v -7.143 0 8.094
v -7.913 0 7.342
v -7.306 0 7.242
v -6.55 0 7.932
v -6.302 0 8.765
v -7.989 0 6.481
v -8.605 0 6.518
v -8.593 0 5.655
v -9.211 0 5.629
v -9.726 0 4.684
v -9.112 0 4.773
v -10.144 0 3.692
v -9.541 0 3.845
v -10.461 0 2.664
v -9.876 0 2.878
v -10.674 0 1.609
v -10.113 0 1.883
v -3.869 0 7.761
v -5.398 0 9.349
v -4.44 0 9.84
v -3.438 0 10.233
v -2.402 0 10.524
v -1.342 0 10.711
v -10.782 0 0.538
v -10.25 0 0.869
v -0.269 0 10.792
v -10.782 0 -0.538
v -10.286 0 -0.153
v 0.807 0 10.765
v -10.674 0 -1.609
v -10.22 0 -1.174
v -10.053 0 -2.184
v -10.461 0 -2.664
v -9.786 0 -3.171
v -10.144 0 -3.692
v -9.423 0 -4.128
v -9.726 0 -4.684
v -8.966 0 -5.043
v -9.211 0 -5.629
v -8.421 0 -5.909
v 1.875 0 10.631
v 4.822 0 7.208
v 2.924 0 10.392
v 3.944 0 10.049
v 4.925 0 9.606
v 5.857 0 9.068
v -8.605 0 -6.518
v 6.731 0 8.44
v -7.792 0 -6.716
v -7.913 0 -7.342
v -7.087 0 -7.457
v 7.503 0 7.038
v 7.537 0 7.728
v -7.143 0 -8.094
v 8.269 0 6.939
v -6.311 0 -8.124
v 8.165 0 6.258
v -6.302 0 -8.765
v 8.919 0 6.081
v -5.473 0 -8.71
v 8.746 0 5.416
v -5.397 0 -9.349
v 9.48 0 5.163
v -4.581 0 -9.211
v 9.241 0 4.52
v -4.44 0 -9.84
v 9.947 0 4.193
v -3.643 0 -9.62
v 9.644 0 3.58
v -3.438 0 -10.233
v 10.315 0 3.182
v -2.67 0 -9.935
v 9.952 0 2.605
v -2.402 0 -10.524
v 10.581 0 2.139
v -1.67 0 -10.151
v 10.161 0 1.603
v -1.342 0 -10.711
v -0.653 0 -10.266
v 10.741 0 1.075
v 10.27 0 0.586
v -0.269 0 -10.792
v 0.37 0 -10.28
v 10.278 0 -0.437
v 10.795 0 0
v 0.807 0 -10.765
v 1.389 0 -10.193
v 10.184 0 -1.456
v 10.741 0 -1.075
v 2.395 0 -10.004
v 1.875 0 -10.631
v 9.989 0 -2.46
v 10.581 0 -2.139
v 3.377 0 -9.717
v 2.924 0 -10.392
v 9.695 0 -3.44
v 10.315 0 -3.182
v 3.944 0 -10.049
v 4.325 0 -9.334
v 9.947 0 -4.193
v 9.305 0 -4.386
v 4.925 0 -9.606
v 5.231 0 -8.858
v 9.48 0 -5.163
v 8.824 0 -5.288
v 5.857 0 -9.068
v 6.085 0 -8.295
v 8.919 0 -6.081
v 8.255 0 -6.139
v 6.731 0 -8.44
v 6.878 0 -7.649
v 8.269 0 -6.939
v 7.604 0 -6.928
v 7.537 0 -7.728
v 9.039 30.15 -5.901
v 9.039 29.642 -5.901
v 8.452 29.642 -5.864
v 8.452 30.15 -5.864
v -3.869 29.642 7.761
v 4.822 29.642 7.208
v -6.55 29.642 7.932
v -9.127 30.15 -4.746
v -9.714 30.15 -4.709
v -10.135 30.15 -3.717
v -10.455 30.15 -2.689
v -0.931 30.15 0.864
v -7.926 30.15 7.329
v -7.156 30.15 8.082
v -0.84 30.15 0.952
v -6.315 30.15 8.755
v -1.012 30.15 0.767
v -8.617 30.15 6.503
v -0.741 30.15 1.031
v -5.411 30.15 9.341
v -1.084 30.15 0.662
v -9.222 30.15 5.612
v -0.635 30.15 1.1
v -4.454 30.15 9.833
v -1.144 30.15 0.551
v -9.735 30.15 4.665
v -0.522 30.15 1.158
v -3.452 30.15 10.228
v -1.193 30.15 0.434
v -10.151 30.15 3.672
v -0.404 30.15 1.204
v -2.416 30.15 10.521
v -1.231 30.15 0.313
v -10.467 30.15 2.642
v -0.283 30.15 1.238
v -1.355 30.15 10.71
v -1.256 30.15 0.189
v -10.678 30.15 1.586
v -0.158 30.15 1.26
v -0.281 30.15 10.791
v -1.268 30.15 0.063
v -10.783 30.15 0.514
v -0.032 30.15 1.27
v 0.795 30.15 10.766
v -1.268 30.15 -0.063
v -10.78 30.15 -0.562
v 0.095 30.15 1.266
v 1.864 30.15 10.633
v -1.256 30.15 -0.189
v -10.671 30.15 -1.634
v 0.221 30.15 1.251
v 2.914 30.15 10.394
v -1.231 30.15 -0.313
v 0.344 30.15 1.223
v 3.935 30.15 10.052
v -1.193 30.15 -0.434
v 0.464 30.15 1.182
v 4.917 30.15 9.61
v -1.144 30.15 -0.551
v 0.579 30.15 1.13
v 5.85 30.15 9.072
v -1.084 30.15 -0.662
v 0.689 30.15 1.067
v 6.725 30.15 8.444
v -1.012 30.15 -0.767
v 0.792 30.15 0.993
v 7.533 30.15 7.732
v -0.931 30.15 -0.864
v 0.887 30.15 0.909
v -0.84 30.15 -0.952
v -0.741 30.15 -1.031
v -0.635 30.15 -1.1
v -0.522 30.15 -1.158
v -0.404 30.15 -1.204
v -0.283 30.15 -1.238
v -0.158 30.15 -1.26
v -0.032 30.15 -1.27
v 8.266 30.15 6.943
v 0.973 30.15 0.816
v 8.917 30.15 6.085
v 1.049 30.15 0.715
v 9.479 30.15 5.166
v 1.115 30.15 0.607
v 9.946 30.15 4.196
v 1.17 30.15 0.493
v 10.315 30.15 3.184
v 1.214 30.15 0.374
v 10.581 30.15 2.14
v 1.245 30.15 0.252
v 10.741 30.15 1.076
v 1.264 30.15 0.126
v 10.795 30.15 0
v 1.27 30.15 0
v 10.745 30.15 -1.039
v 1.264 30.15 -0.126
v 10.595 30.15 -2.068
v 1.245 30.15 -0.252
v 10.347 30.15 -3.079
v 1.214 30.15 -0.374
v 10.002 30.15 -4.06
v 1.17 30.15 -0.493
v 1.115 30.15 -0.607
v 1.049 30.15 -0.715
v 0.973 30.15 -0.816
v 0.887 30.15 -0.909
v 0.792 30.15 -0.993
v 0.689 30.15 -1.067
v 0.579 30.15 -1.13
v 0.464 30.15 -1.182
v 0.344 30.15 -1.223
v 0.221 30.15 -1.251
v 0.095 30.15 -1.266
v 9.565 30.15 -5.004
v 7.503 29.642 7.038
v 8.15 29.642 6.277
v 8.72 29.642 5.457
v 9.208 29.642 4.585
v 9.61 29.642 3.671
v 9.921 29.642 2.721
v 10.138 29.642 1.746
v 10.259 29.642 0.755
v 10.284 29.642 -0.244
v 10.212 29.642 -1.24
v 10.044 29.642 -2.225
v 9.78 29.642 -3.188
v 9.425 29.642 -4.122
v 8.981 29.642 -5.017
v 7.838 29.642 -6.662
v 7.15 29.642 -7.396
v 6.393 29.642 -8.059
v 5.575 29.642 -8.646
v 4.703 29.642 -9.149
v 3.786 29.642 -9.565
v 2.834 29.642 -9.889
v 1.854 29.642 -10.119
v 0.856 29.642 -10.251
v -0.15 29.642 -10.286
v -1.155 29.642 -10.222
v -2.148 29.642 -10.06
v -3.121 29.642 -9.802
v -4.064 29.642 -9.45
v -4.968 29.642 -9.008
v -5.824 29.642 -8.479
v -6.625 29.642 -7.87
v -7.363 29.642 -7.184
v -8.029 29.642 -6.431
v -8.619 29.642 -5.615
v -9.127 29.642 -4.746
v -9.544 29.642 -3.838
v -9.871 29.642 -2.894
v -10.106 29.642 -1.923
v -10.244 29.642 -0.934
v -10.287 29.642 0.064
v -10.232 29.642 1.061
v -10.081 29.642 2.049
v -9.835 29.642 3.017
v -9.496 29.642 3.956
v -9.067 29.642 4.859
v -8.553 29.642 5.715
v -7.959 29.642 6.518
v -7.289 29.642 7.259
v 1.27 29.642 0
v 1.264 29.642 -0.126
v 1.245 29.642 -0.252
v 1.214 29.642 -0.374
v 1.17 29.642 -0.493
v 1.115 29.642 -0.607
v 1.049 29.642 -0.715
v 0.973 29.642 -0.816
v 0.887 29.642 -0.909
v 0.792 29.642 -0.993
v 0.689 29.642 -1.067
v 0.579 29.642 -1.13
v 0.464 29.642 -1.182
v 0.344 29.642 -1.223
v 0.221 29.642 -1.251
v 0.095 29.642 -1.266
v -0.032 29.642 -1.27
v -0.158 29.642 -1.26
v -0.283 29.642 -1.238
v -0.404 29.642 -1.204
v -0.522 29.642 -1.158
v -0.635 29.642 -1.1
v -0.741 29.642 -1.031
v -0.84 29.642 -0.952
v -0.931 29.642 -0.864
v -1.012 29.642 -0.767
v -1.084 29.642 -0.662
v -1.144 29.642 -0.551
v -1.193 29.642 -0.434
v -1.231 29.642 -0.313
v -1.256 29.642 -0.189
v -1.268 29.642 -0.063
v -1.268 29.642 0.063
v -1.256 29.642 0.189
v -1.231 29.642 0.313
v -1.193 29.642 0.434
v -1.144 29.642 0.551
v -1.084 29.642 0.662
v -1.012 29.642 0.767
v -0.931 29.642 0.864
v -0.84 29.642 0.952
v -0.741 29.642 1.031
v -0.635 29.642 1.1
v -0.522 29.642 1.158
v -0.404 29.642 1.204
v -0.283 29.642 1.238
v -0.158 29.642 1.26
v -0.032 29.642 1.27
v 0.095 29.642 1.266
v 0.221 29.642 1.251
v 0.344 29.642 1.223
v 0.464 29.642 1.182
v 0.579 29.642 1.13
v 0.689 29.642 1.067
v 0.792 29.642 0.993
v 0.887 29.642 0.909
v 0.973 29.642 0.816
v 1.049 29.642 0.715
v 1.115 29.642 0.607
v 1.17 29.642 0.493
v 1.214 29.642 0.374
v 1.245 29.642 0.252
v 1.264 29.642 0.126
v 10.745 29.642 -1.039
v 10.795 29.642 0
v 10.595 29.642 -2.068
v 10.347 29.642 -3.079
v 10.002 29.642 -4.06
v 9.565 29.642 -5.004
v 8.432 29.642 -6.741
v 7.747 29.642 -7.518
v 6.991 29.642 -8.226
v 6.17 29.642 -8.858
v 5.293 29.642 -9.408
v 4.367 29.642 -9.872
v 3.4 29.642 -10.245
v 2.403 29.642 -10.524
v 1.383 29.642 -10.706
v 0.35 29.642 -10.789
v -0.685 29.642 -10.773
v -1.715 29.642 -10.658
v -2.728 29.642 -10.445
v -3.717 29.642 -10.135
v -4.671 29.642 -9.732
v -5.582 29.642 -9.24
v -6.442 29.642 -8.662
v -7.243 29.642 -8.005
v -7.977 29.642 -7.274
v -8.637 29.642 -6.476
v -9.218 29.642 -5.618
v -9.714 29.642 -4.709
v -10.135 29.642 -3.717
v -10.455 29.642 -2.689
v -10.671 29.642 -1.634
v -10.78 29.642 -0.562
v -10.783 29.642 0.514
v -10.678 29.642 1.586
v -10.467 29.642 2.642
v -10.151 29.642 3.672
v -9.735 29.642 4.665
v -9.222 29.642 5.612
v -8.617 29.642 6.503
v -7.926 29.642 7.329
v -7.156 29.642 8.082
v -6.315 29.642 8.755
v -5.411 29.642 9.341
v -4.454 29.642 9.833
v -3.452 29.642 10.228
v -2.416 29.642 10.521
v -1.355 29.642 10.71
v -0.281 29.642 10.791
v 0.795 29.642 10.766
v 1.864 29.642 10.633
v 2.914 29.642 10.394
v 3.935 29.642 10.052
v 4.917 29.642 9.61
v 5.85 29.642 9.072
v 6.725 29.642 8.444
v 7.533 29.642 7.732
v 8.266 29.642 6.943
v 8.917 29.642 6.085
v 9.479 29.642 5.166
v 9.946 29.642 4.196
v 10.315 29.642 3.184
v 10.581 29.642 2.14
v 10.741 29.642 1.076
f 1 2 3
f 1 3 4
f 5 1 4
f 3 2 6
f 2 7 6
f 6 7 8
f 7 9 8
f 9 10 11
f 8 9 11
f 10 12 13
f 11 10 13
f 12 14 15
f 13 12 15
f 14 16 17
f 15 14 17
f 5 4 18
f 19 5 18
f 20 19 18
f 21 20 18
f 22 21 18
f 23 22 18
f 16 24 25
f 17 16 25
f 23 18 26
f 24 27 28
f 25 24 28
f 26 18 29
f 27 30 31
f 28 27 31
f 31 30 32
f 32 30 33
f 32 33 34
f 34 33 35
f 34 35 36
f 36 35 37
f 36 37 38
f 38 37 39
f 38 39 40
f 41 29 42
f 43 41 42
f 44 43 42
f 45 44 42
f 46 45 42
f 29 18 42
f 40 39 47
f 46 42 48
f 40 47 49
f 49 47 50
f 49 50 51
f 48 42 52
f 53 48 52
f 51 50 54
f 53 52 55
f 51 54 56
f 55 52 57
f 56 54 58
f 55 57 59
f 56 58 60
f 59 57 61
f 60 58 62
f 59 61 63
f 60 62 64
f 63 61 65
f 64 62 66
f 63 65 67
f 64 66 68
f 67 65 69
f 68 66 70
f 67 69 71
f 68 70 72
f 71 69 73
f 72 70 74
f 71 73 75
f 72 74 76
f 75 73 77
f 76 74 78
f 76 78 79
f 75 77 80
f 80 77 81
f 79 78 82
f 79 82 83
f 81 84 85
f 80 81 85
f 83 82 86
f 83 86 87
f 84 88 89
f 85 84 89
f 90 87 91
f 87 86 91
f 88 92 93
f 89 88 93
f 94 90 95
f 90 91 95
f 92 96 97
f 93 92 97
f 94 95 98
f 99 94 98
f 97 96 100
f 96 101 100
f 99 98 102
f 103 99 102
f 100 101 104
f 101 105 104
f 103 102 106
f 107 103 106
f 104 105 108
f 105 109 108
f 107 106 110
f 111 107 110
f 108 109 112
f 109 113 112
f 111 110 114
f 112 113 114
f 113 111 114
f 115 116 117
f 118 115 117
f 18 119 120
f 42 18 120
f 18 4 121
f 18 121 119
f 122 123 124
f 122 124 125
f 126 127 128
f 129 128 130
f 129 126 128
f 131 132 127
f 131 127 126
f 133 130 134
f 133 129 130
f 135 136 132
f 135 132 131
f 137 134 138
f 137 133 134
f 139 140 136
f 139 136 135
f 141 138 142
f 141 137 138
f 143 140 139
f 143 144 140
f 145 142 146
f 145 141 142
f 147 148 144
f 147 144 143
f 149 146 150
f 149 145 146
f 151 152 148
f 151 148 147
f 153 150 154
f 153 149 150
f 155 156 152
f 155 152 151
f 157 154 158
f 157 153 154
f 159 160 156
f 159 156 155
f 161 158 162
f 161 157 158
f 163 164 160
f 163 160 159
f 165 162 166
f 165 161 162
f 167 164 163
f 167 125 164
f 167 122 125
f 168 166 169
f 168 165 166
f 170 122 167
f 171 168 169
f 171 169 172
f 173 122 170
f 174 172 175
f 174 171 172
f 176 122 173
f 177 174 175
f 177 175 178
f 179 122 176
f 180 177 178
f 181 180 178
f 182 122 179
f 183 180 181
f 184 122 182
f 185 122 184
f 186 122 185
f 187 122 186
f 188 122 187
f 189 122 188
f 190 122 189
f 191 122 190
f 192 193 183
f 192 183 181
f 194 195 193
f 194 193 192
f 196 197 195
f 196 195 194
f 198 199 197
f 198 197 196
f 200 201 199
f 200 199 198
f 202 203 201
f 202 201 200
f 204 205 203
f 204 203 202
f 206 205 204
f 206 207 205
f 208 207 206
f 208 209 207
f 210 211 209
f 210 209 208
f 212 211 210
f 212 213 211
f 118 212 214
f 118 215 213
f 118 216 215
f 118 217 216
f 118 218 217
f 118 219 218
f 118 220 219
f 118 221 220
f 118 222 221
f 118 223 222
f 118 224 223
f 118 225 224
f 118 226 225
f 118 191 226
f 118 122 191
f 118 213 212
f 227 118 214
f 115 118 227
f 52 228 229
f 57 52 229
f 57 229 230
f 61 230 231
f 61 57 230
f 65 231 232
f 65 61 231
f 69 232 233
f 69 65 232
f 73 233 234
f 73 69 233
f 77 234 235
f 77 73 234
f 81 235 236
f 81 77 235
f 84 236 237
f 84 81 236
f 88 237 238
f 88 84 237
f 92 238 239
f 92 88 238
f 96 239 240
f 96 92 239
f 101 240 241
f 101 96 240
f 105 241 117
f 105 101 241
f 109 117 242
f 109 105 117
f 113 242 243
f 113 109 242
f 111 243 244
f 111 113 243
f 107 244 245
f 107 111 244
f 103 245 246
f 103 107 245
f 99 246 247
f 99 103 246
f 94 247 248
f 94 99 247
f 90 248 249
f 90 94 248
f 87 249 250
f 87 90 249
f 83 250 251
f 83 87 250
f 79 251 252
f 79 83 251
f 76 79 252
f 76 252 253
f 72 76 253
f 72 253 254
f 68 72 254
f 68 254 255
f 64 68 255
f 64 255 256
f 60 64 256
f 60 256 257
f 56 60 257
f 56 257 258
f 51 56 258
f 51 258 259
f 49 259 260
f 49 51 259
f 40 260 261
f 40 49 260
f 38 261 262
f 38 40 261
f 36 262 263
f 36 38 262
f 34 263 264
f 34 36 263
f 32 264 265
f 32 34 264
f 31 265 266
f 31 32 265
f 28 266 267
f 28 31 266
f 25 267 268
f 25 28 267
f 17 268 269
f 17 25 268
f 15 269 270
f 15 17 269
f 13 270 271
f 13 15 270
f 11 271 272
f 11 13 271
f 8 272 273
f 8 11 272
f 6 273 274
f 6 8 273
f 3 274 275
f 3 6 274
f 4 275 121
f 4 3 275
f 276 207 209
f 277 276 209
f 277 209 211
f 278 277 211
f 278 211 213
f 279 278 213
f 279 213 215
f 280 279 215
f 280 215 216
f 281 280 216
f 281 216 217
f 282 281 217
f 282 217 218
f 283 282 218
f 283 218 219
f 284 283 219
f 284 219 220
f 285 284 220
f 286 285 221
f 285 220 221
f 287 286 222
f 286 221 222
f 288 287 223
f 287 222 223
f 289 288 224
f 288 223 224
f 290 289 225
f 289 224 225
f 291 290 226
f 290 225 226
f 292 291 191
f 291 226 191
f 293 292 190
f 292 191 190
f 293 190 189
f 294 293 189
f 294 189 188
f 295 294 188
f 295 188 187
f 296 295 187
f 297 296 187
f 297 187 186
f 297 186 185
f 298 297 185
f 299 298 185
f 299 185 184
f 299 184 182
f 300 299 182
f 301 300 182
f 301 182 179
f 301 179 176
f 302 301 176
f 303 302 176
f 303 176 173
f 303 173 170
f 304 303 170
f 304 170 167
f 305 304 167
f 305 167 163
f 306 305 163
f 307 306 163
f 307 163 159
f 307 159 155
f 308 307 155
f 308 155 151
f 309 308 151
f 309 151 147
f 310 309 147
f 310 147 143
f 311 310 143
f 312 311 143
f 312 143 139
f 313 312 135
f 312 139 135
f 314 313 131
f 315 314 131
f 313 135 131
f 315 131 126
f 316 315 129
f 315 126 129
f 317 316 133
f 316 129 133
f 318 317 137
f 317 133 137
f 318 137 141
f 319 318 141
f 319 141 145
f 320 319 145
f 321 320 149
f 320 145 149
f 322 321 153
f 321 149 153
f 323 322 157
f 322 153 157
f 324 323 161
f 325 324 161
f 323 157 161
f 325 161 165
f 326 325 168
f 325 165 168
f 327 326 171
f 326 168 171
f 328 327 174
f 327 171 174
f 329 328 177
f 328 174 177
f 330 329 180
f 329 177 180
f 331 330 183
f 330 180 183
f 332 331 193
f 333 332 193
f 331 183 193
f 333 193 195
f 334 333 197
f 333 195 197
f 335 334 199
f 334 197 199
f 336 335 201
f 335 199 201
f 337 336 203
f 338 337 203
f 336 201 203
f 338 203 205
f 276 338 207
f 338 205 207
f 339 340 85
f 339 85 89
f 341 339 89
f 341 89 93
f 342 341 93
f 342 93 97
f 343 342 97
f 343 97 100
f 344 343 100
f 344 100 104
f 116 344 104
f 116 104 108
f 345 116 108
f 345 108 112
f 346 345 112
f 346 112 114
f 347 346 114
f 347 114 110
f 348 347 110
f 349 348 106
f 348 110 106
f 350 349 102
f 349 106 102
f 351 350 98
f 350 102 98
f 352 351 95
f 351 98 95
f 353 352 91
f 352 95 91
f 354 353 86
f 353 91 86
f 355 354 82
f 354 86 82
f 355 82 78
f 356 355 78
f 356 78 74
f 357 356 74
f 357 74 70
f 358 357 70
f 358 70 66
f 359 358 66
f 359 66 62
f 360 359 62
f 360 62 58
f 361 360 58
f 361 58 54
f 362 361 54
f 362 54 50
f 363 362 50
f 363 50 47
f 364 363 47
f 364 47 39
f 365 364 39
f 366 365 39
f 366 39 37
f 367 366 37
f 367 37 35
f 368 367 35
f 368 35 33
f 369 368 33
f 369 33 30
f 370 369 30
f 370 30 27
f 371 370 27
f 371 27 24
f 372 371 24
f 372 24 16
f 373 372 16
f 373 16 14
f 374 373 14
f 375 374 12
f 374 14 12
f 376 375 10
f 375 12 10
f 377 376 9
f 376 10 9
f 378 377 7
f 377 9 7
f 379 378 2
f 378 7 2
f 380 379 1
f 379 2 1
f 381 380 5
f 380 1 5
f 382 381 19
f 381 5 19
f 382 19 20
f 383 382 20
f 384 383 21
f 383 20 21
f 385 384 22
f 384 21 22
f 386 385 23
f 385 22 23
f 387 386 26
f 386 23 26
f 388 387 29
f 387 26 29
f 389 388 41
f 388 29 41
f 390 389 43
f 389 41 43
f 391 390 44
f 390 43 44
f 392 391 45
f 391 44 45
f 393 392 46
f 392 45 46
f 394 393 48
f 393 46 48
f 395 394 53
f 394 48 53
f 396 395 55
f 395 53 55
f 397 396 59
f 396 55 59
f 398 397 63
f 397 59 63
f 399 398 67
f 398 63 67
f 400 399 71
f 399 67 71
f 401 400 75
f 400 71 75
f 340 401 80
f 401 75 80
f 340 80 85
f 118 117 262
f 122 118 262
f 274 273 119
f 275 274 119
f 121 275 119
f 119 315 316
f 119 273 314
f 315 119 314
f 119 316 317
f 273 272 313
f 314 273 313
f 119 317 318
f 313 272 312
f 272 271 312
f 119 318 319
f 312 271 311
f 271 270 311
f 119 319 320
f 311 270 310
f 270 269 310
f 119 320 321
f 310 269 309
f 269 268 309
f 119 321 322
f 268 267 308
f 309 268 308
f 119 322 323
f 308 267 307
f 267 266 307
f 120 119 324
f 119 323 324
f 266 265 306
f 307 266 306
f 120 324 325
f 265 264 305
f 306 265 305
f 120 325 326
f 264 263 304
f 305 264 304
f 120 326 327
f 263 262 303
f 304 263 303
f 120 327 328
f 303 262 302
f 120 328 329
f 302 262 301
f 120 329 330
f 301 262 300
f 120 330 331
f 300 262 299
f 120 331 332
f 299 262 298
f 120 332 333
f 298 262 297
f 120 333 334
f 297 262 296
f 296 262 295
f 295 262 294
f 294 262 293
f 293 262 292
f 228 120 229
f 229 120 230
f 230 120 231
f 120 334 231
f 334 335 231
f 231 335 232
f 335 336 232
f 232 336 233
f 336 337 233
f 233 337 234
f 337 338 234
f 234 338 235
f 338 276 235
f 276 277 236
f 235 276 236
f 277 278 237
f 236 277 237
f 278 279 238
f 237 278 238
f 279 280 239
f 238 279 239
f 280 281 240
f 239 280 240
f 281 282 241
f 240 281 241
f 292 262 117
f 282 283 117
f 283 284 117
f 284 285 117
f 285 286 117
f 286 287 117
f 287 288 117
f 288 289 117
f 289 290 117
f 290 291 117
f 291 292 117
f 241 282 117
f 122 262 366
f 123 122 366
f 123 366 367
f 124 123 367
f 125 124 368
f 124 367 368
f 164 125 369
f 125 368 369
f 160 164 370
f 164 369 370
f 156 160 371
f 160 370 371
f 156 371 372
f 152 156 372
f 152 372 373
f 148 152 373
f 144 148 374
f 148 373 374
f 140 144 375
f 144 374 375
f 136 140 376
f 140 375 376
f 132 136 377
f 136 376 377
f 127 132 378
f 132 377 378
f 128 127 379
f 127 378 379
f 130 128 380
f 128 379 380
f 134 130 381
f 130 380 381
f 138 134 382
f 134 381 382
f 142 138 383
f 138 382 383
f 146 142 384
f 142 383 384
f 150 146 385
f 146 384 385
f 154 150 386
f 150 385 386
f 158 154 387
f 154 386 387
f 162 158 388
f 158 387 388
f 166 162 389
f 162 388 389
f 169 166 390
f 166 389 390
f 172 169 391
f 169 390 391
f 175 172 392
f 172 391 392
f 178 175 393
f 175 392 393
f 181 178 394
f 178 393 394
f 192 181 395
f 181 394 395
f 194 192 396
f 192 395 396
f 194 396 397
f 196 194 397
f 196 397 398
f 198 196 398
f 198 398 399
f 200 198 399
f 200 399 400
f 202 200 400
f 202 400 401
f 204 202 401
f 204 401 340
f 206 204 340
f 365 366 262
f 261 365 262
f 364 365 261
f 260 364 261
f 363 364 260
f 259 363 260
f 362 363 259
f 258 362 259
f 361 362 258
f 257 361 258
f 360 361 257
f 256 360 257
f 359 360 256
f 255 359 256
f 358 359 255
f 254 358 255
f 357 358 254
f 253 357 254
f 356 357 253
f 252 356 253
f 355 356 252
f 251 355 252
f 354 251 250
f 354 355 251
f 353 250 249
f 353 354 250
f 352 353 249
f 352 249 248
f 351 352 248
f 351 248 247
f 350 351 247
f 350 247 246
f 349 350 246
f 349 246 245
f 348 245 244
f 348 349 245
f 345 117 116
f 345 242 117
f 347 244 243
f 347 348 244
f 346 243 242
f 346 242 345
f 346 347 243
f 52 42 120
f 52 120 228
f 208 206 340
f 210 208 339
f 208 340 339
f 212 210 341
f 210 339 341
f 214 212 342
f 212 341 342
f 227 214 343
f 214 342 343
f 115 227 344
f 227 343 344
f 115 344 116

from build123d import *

# Parameters (mm, degrees)
SKETCH1_R           = 10.795
SKETCH1_R_2         = 10.287
BOSS_EXTRUDE1_DEPTH = 29.6418
BOSS_EXTRUDE3_DEPTH = 0.508
SKETCH3_R           = 1.27
CUT_EXTRUDE1_DEPTH  = 31.1498
BOSS_EXTRUDE4_REACH = 32.15


with BuildPart() as part:
    # Sketch1 → Boss-Extrude1 (new body)
    with BuildSketch(Plane(origin=(0, 0, 0), x_dir=(1, 0, 0), z_dir=(0, 1, 0))):
        Circle(SKETCH1_R)
        Circle(SKETCH1_R_2, mode=Mode.SUBTRACT)
    extrude(amount=BOSS_EXTRUDE1_DEPTH)

    # Sketch2 → Boss-Extrude3 (add)
    with BuildSketch(Plane(origin=(0, 29.6418, 0), x_dir=(1, 0, 0), z_dir=(0, 1, 0))):
        with BuildLine():
            Line((8.451883262, 5.864131507), (-9.126833577, 4.745869558))
            ThreePointArc((-9.126833577, 4.745869558), (-2.442809038, -9.992750022), (10.287, 0))
            ThreePointArc((10.287, 0), (9.81750712, 3.072283018), (8.451883262, 5.864131507))
        make_face()
        with BuildLine():
            Line((-9.126833577, 4.745869558), (-9.714005015, 4.708516918))
            ThreePointArc((-9.714005015, 4.708516918), (-2.415506247, -10.521281033), (10.795, 0))
            ThreePointArc((10.795, 0), (10.346705284, 3.078589735), (9.0390547, 5.901484146))
            Line((9.0390547, 5.901484146), (8.451883262, 5.864131507))
            ThreePointArc((8.451883262, 5.864131507), (9.81750712, 3.072283018), (10.287, 0))
            ThreePointArc((10.287, 0), (-2.442809038, -9.992750022), (-9.126833577, 4.745869558))
        make_face()
    extrude(amount=BOSS_EXTRUDE3_DEPTH)

    # Sketch3 → Cut-Extrude1 (cut, through all)
    with BuildSketch(Plane(origin=(0, 30.1498, 0), x_dir=(1, 0, 0), z_dir=(0, 1, 0))):
        Circle(SKETCH3_R)
    extrude(amount=-CUT_EXTRUDE1_DEPTH, mode=Mode.SUBTRACT)

    # Sketch6 → Boss-Extrude4 (add, up to next)
    with BuildSketch(Plane.XZ, mode=Mode.PRIVATE) as boss_extrude4_sk1:
        with BuildLine():
            Line((-3.869377765, 7.761308892), (4.821670905, 7.208431847))
            Line((4.821670905, 7.208431847), (7.502708149, 7.037878901))
            ThreePointArc((7.502708149, 7.037878901), (0.653082635, 10.266248198), (-6.550415009, 7.931861837))
            Line((-6.550415009, 7.931861837), (-3.869377765, 7.761308892))
        make_face()
    boss_extrude4_tool1 = extrude(boss_extrude4_sk1.sketch, amount=-BOSS_EXTRUDE4_REACH, mode=Mode.PRIVATE) - part.part
    add(boss_extrude4_tool1.solids().sort_by_distance((0.547813, 0, 8.611444))[0])


solid = part.part
